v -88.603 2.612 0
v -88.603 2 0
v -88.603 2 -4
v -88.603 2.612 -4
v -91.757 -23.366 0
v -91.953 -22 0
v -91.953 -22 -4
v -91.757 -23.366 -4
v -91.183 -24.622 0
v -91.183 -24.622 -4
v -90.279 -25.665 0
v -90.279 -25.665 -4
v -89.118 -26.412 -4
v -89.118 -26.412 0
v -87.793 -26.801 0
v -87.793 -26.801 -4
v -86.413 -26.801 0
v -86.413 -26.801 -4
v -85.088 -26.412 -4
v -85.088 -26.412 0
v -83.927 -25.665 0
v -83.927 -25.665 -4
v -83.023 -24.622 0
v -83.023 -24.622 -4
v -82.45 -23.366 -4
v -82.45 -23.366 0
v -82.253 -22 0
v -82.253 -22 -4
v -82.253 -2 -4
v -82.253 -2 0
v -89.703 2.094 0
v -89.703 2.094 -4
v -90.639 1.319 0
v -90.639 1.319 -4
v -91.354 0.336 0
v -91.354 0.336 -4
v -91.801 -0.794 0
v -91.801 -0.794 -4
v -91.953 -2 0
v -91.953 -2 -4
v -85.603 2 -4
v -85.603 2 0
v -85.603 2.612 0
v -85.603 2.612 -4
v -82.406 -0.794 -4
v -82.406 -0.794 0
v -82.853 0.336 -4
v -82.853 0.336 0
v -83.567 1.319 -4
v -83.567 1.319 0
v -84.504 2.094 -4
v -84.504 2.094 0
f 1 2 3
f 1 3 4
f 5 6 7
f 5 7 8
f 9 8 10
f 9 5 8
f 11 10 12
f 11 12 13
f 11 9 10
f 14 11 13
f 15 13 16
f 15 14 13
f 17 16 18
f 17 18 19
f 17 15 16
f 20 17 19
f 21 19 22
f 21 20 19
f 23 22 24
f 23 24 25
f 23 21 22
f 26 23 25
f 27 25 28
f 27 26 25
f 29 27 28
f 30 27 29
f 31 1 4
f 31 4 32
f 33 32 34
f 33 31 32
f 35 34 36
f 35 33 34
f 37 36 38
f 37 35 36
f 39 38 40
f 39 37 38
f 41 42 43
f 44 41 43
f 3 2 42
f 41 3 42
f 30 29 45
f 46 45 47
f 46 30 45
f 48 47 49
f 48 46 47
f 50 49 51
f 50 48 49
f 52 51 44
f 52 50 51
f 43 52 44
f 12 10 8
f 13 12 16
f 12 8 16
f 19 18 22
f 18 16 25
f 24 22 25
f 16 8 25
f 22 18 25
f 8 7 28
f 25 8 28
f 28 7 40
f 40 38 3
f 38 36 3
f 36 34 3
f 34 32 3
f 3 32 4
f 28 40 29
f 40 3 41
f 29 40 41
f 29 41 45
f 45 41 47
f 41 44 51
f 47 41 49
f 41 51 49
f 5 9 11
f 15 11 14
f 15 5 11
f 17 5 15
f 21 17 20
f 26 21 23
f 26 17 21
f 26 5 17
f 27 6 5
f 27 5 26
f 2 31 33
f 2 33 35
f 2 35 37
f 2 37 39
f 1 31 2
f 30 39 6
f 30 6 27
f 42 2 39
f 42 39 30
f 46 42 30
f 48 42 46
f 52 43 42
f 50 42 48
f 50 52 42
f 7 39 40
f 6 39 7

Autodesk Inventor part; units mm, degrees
ref_plane "YZ Plane" through (0, 0, 0) normal (1, 0, 0) x (0, 1, 0)
ref_plane "XZ Plane" through (0, 0, 0) normal (0, 1, 0) x (-1, 0, 0)
ref_plane "XY Plane" through (0, 0, 0) normal (0, 0, 1) x (1, 0, 0)
ref_plane "Work Plane1" through (0, 0, 0) normal (0, 0, 1) x (1, 0, 0)
sketch "Sketch1" plane through (0, 0, 0) normal (0, 0, 1) x (1, 0, 0)
  line L0 (227.5976, -2) -> (227.5976, -22) projected
  arc A0 (217.5976, -22) -> (227.5976, -22) centre (222.5976, -22) ccw projected
  line L1 (217.5976, -22) -> (217.5976, -2) projected
  arc A1 (227.5976, -2) -> (217.5976, -2) centre (222.5976, -2) ccw projected
  line L2 (78.8821, -22) -> (78.8821, -2) projected
  arc A2 (88.8821, -2) -> (78.8821, -2) centre (83.8821, -2) ccw projected
  line L3 (88.8821, -2) -> (88.8821, -22) projected
  arc A3 (78.8821, -22) -> (88.8821, -22) centre (83.8821, -22) ccw projected
  line L4 (-82.1032, -2) -> (-82.1032, -22) projected
  arc A4 (-92.1032, -22) -> (-82.1032, -22) centre (-87.1032, -22) ccw projected
  line L5 (-92.1032, -22) -> (-92.1032, -2) projected
  arc A5 (-82.1032, -2) -> (-92.1032, -2) centre (-87.1032, -2) ccw projected
  line L6 (374.3969, 34.0458) -> (374.3969, -61) projected
  line L7 (344.0734, 61) -> (374.3969, 34.0458) projected
  line L8 (-316.3526, 61) -> (344.0734, 61) projected
  line L9 (-354.2917, 27.0499) -> (-316.3526, 61) projected
  line L10 (-54.9688, -61) -> (-354.2917, 27.0499) projected
  line L11 (374.3969, -61) -> (-54.9688, -61) projected
  line L12 (-87.1032, -22) -> (-87.1032, -2) construction
  line L13 (-82.2532, -22) -> (-82.2532, -2)
  line L14 (-91.9532, -2) -> (-91.9532, -22)
  arc A6 (-91.9532, -22) -> (-82.2532, -22) centre (-87.1032, -22) ccw
  arc A7 (-82.2532, -2) -> (-91.9532, -2) centre (-87.1032, -2) ccw
  line L15 (-87.1032, 3) -> (-87.1032, 2)
  line L16 (-87.1032, 2) -> (-84.3605, 2)
  line L17 (-87.1032, 2) -> (-89.8459, 2)
  line L18 (-87.1032, 2) -> (-88.6032, 2)
  line L19 (-88.6032, 2) -> (-85.6032, 2)
  line L20 (-85.6032, 2) -> (-85.6032, 4.0639)
  line L21 (-88.6032, 2) -> (-88.6032, 3.4505)
  point P0 (0, 0)
  point P1 (-87.1032, -12)
  point P2 (-85.6032, 2.6122)
  point P3 (-88.6032, 2.6122)
  dimension "d0" = 9.7
  dimension "d1" = 1
  dimension "d2" = 1.5
  dimension "d3" = 3
extrude "Extrusion1" add sketch "Sketch1" against normal blind 4 contours A7 L16 L20 | A7 L13 A6 L14 L17 L16 | L21 L17 A7
properties part number "zaslepka_sruby_2"
